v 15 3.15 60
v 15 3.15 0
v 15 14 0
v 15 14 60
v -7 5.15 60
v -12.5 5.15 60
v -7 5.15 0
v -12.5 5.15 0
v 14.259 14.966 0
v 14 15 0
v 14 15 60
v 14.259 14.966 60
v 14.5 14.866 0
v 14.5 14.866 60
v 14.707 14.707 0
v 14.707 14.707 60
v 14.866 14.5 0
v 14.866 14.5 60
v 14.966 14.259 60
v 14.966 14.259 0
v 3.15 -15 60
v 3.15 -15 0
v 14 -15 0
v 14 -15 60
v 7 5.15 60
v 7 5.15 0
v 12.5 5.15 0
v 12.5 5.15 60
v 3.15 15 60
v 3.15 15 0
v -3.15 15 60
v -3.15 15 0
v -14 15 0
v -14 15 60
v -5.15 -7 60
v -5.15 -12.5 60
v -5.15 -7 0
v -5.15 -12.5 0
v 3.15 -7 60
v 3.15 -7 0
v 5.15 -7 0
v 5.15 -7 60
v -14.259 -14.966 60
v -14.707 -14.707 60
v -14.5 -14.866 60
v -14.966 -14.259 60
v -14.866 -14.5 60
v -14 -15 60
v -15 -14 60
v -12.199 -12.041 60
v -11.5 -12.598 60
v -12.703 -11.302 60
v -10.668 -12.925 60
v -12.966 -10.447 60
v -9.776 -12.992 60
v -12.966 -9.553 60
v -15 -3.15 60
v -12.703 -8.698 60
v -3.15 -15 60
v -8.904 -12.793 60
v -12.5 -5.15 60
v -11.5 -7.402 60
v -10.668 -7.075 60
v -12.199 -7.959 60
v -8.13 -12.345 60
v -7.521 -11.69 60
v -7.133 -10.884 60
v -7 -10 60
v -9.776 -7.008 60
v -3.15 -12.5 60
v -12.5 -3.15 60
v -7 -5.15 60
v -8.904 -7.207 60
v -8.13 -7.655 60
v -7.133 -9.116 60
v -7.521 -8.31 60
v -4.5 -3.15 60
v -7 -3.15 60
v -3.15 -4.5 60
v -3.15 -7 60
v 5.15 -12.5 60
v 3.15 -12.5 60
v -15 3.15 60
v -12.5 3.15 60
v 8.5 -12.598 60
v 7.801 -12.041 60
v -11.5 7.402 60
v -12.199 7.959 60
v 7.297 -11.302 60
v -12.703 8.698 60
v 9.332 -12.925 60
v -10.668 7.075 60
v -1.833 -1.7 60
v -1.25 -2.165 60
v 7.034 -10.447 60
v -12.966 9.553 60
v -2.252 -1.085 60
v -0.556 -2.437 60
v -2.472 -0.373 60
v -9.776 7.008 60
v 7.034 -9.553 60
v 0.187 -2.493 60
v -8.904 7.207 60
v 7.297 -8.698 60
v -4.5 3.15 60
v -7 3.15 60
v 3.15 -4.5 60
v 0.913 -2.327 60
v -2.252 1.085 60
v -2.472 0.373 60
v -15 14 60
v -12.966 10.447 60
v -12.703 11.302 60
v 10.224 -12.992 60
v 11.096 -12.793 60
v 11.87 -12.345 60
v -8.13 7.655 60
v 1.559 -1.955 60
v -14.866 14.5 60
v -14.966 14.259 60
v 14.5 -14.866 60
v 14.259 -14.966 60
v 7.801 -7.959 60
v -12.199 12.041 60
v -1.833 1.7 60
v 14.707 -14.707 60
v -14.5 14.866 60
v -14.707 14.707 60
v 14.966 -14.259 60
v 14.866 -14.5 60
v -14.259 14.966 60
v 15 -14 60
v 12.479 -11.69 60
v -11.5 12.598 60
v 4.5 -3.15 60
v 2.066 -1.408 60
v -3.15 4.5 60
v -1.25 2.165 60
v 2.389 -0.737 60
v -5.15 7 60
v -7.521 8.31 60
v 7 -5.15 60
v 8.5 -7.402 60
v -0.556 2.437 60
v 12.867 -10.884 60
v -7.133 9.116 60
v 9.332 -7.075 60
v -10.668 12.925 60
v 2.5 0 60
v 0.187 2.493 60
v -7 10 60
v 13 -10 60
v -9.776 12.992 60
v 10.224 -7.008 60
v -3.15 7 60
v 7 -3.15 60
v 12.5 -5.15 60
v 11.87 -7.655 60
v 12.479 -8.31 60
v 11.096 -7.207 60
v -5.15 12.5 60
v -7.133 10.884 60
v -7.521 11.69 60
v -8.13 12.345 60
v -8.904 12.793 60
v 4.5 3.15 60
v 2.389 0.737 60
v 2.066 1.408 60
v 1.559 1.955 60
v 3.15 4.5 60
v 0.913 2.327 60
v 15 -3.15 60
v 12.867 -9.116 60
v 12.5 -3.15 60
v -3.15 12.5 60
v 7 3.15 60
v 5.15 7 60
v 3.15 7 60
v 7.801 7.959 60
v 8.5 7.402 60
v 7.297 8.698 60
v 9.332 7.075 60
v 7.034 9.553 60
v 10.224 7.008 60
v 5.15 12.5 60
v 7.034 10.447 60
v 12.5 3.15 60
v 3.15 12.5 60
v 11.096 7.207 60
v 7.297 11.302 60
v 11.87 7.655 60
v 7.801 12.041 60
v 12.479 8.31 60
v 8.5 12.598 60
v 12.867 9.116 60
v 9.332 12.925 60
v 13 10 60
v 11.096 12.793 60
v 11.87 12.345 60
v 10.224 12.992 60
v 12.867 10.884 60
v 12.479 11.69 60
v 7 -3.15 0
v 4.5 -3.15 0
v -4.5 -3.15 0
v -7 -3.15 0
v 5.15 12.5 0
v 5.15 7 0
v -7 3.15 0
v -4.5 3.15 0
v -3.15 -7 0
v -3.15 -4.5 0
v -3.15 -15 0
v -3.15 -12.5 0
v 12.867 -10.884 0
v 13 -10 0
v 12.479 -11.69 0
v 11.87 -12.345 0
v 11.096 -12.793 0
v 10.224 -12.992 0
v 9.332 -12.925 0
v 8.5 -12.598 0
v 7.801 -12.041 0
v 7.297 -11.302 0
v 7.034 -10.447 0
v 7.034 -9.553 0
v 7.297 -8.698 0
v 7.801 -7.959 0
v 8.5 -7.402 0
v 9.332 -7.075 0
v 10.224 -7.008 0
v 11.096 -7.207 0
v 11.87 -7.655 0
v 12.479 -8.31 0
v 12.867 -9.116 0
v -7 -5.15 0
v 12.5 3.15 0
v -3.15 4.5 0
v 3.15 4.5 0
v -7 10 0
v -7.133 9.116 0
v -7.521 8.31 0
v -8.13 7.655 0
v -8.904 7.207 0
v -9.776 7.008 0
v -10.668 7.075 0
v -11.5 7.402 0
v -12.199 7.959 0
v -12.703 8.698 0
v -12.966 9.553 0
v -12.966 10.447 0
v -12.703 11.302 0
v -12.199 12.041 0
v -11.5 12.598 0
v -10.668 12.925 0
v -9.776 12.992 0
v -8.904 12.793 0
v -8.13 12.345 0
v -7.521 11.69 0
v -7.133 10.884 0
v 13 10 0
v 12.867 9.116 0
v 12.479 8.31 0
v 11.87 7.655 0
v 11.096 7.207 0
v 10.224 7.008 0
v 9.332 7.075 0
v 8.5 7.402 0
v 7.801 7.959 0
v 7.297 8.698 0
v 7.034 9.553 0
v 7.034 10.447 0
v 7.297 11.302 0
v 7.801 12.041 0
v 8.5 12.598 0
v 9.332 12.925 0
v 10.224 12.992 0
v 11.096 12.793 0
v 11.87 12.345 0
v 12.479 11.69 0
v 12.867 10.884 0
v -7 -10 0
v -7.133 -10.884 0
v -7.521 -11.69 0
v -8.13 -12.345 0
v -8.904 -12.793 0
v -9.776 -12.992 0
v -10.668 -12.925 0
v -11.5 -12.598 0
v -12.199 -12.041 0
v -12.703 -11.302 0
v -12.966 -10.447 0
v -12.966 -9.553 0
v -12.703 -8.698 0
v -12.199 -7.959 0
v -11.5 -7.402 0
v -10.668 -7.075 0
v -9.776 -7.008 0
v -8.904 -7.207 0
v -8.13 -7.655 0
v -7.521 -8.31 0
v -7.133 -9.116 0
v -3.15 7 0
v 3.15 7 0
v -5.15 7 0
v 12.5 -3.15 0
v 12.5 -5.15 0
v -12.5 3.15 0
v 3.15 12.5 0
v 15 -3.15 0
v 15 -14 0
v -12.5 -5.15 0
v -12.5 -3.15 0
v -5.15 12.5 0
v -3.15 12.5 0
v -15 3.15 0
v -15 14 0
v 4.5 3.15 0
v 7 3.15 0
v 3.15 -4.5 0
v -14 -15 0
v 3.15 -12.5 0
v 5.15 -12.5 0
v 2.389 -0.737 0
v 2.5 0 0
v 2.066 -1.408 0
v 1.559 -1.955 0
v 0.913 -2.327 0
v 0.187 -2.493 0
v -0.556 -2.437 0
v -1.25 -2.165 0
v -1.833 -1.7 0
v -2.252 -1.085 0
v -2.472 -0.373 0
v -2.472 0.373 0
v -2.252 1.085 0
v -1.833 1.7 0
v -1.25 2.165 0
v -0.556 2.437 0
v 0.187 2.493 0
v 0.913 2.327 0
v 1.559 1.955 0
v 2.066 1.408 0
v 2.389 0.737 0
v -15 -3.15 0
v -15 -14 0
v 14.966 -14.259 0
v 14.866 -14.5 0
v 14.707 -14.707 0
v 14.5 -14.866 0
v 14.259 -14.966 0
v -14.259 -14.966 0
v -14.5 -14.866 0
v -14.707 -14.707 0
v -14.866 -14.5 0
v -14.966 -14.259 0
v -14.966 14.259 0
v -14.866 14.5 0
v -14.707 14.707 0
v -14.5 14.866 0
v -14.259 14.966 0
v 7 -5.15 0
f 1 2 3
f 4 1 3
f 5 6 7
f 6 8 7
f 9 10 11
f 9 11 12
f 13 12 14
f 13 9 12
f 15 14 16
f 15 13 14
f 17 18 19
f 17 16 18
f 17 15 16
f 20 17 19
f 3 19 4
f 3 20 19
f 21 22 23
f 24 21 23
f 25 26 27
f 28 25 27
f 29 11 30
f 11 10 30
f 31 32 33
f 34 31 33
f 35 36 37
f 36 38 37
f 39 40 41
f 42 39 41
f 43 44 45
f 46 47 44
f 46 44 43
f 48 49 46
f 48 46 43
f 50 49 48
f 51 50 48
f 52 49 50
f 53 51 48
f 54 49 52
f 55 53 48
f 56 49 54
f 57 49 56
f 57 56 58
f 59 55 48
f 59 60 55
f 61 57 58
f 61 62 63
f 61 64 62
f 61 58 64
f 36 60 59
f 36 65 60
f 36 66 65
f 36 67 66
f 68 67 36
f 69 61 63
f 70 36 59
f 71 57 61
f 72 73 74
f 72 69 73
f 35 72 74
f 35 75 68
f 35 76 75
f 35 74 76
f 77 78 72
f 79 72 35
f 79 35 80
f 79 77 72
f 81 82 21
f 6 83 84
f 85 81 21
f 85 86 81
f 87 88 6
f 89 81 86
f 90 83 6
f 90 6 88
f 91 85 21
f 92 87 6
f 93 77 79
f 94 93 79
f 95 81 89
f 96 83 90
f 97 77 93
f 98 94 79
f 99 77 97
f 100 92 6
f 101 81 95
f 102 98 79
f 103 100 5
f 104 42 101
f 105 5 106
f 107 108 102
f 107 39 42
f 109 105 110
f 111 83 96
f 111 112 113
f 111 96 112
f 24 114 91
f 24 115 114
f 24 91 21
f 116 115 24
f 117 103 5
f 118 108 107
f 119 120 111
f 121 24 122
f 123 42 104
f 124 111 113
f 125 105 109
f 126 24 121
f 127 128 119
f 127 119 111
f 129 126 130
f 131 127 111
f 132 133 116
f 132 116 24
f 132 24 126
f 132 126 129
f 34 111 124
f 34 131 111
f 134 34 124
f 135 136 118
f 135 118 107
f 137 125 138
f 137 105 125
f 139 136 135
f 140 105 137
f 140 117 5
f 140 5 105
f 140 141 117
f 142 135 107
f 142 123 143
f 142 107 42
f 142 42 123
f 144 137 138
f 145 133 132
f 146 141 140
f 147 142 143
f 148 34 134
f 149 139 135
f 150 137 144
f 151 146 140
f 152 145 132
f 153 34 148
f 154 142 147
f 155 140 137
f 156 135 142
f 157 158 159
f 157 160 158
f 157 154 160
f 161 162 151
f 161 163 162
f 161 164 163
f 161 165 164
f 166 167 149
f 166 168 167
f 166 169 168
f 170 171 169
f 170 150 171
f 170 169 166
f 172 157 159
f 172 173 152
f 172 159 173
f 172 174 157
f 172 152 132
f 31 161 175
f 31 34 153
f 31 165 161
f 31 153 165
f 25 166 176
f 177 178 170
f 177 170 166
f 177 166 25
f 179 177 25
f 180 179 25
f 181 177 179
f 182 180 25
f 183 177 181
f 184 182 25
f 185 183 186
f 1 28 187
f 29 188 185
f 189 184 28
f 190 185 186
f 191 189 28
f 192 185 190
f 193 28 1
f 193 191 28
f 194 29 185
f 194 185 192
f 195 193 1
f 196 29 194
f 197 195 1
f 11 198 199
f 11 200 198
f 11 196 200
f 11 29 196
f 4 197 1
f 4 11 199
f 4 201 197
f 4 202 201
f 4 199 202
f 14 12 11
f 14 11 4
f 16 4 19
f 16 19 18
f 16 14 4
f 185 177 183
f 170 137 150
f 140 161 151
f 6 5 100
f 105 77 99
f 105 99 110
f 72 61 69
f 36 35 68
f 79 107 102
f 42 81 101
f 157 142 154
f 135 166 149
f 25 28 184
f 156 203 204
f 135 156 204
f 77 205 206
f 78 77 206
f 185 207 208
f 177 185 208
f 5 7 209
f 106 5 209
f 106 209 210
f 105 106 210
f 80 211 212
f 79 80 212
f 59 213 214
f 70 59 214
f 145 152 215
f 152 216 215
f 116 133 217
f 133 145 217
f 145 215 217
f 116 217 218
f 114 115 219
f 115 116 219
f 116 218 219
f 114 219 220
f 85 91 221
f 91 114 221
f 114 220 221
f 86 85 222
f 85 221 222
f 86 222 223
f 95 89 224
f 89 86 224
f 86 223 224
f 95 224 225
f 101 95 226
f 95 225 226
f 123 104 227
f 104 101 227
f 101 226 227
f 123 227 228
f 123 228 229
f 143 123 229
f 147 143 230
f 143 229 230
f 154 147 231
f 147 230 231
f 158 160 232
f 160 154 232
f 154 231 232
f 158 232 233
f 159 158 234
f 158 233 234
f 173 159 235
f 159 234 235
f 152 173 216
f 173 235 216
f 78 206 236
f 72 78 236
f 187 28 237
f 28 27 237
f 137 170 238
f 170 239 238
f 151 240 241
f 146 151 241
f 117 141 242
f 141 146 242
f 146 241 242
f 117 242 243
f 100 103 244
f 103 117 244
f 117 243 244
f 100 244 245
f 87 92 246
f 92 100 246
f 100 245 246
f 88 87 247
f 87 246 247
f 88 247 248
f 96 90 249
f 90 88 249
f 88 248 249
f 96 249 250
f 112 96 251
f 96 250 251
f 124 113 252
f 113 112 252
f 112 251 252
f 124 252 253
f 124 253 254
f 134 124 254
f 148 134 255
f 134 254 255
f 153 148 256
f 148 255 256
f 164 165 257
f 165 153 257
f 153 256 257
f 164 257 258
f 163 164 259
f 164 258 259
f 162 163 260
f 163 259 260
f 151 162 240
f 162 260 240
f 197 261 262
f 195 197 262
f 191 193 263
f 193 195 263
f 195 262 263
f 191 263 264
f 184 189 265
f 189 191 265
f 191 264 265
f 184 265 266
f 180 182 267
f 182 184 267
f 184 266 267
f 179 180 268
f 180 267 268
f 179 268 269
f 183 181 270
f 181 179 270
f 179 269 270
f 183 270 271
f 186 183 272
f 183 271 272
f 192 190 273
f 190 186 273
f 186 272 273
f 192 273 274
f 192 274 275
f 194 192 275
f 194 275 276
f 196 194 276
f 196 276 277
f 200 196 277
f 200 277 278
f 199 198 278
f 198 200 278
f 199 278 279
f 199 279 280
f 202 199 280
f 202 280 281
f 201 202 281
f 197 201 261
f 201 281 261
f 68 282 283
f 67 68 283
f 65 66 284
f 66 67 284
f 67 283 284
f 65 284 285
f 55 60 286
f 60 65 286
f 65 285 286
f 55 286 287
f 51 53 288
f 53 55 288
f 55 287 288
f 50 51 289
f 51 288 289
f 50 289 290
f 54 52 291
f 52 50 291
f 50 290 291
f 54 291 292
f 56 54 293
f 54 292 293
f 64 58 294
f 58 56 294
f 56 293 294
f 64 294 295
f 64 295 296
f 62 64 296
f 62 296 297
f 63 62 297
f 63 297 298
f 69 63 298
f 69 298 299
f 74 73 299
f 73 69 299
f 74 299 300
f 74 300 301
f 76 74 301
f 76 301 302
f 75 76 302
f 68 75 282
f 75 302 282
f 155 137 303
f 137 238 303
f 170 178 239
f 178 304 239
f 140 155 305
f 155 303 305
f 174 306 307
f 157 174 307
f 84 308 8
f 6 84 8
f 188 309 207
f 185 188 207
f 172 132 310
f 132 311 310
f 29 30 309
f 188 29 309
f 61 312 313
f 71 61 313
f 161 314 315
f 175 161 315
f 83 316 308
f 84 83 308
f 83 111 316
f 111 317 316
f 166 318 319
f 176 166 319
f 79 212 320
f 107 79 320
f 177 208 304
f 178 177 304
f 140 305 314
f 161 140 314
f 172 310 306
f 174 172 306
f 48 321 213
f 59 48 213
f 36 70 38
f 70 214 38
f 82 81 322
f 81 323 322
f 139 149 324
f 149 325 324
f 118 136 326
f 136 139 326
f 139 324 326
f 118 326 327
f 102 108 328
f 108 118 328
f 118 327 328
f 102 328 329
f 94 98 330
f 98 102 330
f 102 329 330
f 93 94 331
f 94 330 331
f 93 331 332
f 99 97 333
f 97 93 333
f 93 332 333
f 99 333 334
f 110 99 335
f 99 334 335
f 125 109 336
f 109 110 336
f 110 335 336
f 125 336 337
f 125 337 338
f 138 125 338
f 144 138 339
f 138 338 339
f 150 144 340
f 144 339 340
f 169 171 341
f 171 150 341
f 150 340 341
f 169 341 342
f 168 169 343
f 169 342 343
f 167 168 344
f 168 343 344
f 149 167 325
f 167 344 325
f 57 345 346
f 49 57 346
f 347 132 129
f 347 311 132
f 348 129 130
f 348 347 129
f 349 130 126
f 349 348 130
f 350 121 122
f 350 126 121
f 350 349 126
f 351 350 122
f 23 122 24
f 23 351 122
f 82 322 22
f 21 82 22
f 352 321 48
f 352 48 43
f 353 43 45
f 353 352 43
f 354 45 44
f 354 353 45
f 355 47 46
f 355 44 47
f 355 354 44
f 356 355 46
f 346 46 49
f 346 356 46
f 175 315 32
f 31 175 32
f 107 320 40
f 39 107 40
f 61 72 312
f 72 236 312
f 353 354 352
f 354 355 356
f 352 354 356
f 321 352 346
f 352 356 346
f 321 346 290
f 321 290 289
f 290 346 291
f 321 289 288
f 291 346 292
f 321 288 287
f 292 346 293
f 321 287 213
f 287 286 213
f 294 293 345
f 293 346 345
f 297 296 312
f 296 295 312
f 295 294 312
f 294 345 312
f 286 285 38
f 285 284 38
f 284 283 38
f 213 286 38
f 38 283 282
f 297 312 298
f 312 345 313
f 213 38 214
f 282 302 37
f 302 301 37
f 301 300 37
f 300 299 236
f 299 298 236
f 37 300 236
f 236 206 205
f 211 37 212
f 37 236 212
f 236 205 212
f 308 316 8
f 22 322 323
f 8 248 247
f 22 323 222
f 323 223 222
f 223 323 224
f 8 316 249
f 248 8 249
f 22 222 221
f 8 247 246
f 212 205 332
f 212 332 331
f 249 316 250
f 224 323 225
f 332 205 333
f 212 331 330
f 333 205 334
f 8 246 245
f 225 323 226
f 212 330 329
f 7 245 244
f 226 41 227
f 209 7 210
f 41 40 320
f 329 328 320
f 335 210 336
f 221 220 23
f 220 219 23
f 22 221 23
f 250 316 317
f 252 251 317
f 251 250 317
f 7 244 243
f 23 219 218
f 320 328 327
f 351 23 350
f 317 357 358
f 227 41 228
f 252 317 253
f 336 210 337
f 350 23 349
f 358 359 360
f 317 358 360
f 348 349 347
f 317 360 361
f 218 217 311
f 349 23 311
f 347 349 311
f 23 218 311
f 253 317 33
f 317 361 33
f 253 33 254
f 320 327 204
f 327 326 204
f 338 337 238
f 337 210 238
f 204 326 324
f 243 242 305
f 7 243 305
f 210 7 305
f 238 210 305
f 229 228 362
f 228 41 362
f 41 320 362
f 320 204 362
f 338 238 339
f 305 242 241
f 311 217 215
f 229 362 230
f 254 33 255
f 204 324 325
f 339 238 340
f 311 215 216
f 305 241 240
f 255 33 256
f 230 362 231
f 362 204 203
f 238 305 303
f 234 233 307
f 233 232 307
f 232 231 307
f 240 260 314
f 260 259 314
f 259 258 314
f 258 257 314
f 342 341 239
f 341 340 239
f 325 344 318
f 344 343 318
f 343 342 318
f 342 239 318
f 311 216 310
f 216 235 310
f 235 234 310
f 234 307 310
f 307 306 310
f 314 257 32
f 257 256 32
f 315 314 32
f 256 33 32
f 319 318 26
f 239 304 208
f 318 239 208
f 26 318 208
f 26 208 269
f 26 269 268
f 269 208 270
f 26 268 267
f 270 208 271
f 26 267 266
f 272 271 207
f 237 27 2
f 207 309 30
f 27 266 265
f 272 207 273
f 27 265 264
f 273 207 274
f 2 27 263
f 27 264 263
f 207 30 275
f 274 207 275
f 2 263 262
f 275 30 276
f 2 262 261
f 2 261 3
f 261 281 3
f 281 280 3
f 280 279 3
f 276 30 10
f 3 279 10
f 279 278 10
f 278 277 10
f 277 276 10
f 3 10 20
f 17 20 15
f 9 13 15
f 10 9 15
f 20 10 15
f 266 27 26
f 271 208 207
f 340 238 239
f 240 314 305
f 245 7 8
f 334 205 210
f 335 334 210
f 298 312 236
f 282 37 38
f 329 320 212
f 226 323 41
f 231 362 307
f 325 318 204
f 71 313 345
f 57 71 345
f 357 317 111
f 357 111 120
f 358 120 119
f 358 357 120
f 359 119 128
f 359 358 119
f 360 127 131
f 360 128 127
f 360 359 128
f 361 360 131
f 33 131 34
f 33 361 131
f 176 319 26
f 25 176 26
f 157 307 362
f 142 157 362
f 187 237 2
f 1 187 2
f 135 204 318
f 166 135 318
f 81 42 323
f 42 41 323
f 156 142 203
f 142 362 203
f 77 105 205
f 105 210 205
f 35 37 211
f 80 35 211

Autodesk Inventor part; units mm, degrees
ref_plane "YZ Plane" through (0, 0, 0) normal (1, 0, 0) x (0, 1, 0)
ref_plane "XZ Plane" through (0, 0, 0) normal (0, 1, 0) x (-1, 0, 0)
ref_plane "XY Plane" through (0, 0, 0) normal (0, 0, 1) x (1, 0, 0)
feature "ソリッド1" [suppressed]
sketch "スケッチ2" plane through (0, 0, 0) normal (0, 0, 1) x (1, 0, 0)
  line L0 (-12.5, 5.15) -> (-7, 5.15) projected
  line L1 (-7, 5.15) -> (-7, 3.15) projected
  line L2 (-7, 3.15) -> (-4.5, 3.15) projected
  line L3 (-4.5, 3.15) -> (-4.5, -3.15) projected
  line L4 (-4.5, -3.15) -> (-7, -3.15) projected
  line L5 (-7, -3.15) -> (-7, -5.15) projected
  line L6 (-7, -5.15) -> (-12.5, -5.15) projected
  line L7 (-12.5, -5.15) -> (-12.5, -3.15) projected
  line L8 (-12.5, -3.15) -> (-15, -3.15) projected
  line L9 (-15, -3.15) -> (-15, -14) projected
  arc A0 (-15, -14) -> (-14, -15) centre (-14, -14) ccw projected
  line L10 (-14, -15) -> (-3.15, -15) projected
  line L11 (-3.15, -15) -> (-3.15, -12.5) projected
  line L12 (-3.15, -12.5) -> (-5.15, -12.5) projected
  line L13 (-5.15, -12.5) -> (-5.15, -7) projected
  line L14 (-5.15, -7) -> (-3.15, -7) projected
  line L15 (-3.15, -7) -> (-3.15, -4.5) projected
  line L16 (-3.15, -4.5) -> (3.15, -4.5) projected
  line L17 (3.15, -4.5) -> (3.15, -7) projected
  line L18 (3.15, -7) -> (5.15, -7) projected
  line L19 (5.15, -7) -> (5.15, -12.5) projected
  line L20 (5.15, -12.5) -> (3.15, -12.5) projected
  line L21 (3.15, -12.5) -> (3.15, -15) projected
  line L22 (3.15, -15) -> (14, -15) projected
  arc A1 (14, -15) -> (15, -14) centre (14, -14) ccw projected
  line L23 (15, -14) -> (15, -3.15) projected
  line L24 (15, -3.15) -> (12.5, -3.15) projected
  line L25 (12.5, -3.15) -> (12.5, -5.15) projected
  line L26 (12.5, -5.15) -> (7, -5.15) projected
  line L27 (7, -5.15) -> (7, -3.15) projected
  line L28 (7, -3.15) -> (4.5, -3.15) projected
  line L29 (4.5, -3.15) -> (4.5, 3.15) projected
  line L30 (4.5, 3.15) -> (7, 3.15) projected
  line L31 (7, 3.15) -> (7, 5.15) projected
  line L32 (7, 5.15) -> (12.5, 5.15) projected
  line L33 (12.5, 5.15) -> (12.5, 3.15) projected
  line L34 (12.5, 3.15) -> (15, 3.15) projected
  line L35 (15, 3.15) -> (15, 14) projected
  arc A2 (15, 14) -> (14, 15) centre (14, 14) ccw projected
  line L36 (14, 15) -> (3.15, 15) projected
  line L37 (3.15, 15) -> (3.15, 12.5) projected
  line L38 (3.15, 12.5) -> (5.15, 12.5) projected
  line L39 (5.15, 12.5) -> (5.15, 7) projected
  line L40 (5.15, 7) -> (3.15, 7) projected
  line L41 (3.15, 7) -> (3.15, 4.5) projected
  line L42 (3.15, 4.5) -> (-3.15, 4.5) projected
  line L43 (-3.15, 4.5) -> (-3.15, 7) projected
  line L44 (-3.15, 7) -> (-5.15, 7) projected
  line L45 (-5.15, 7) -> (-5.15, 12.5) projected
  line L46 (-5.15, 12.5) -> (-3.15, 12.5) projected
  line L47 (-3.15, 12.5) -> (-3.15, 15) projected
  line L48 (-3.15, 15) -> (-14, 15) projected
  arc A3 (-14, 15) -> (-15, 14) centre (-14, 14) ccw projected
  line L49 (-15, 14) -> (-15, 3.15) projected
  line L50 (-15, 3.15) -> (-12.5, 3.15) projected
  line L51 (-12.5, 3.15) -> (-12.5, 5.15) projected
  circle A4 centre (10, 10) radius 3 projected
  circle A5 centre (-10, 10) radius 3 projected
  circle A6 centre (-10, -10) radius 3 projected
  circle A7 centre (10, -10) radius 3 projected
  circle A8 centre (0, 0) radius 2.5 projected
extrude "押し出し1" add sketch "スケッチ2" along normal blind 60
equation "\"d1\" = L"
equation "\"L\" = 60"
properties part number "AFS-3030-60"
